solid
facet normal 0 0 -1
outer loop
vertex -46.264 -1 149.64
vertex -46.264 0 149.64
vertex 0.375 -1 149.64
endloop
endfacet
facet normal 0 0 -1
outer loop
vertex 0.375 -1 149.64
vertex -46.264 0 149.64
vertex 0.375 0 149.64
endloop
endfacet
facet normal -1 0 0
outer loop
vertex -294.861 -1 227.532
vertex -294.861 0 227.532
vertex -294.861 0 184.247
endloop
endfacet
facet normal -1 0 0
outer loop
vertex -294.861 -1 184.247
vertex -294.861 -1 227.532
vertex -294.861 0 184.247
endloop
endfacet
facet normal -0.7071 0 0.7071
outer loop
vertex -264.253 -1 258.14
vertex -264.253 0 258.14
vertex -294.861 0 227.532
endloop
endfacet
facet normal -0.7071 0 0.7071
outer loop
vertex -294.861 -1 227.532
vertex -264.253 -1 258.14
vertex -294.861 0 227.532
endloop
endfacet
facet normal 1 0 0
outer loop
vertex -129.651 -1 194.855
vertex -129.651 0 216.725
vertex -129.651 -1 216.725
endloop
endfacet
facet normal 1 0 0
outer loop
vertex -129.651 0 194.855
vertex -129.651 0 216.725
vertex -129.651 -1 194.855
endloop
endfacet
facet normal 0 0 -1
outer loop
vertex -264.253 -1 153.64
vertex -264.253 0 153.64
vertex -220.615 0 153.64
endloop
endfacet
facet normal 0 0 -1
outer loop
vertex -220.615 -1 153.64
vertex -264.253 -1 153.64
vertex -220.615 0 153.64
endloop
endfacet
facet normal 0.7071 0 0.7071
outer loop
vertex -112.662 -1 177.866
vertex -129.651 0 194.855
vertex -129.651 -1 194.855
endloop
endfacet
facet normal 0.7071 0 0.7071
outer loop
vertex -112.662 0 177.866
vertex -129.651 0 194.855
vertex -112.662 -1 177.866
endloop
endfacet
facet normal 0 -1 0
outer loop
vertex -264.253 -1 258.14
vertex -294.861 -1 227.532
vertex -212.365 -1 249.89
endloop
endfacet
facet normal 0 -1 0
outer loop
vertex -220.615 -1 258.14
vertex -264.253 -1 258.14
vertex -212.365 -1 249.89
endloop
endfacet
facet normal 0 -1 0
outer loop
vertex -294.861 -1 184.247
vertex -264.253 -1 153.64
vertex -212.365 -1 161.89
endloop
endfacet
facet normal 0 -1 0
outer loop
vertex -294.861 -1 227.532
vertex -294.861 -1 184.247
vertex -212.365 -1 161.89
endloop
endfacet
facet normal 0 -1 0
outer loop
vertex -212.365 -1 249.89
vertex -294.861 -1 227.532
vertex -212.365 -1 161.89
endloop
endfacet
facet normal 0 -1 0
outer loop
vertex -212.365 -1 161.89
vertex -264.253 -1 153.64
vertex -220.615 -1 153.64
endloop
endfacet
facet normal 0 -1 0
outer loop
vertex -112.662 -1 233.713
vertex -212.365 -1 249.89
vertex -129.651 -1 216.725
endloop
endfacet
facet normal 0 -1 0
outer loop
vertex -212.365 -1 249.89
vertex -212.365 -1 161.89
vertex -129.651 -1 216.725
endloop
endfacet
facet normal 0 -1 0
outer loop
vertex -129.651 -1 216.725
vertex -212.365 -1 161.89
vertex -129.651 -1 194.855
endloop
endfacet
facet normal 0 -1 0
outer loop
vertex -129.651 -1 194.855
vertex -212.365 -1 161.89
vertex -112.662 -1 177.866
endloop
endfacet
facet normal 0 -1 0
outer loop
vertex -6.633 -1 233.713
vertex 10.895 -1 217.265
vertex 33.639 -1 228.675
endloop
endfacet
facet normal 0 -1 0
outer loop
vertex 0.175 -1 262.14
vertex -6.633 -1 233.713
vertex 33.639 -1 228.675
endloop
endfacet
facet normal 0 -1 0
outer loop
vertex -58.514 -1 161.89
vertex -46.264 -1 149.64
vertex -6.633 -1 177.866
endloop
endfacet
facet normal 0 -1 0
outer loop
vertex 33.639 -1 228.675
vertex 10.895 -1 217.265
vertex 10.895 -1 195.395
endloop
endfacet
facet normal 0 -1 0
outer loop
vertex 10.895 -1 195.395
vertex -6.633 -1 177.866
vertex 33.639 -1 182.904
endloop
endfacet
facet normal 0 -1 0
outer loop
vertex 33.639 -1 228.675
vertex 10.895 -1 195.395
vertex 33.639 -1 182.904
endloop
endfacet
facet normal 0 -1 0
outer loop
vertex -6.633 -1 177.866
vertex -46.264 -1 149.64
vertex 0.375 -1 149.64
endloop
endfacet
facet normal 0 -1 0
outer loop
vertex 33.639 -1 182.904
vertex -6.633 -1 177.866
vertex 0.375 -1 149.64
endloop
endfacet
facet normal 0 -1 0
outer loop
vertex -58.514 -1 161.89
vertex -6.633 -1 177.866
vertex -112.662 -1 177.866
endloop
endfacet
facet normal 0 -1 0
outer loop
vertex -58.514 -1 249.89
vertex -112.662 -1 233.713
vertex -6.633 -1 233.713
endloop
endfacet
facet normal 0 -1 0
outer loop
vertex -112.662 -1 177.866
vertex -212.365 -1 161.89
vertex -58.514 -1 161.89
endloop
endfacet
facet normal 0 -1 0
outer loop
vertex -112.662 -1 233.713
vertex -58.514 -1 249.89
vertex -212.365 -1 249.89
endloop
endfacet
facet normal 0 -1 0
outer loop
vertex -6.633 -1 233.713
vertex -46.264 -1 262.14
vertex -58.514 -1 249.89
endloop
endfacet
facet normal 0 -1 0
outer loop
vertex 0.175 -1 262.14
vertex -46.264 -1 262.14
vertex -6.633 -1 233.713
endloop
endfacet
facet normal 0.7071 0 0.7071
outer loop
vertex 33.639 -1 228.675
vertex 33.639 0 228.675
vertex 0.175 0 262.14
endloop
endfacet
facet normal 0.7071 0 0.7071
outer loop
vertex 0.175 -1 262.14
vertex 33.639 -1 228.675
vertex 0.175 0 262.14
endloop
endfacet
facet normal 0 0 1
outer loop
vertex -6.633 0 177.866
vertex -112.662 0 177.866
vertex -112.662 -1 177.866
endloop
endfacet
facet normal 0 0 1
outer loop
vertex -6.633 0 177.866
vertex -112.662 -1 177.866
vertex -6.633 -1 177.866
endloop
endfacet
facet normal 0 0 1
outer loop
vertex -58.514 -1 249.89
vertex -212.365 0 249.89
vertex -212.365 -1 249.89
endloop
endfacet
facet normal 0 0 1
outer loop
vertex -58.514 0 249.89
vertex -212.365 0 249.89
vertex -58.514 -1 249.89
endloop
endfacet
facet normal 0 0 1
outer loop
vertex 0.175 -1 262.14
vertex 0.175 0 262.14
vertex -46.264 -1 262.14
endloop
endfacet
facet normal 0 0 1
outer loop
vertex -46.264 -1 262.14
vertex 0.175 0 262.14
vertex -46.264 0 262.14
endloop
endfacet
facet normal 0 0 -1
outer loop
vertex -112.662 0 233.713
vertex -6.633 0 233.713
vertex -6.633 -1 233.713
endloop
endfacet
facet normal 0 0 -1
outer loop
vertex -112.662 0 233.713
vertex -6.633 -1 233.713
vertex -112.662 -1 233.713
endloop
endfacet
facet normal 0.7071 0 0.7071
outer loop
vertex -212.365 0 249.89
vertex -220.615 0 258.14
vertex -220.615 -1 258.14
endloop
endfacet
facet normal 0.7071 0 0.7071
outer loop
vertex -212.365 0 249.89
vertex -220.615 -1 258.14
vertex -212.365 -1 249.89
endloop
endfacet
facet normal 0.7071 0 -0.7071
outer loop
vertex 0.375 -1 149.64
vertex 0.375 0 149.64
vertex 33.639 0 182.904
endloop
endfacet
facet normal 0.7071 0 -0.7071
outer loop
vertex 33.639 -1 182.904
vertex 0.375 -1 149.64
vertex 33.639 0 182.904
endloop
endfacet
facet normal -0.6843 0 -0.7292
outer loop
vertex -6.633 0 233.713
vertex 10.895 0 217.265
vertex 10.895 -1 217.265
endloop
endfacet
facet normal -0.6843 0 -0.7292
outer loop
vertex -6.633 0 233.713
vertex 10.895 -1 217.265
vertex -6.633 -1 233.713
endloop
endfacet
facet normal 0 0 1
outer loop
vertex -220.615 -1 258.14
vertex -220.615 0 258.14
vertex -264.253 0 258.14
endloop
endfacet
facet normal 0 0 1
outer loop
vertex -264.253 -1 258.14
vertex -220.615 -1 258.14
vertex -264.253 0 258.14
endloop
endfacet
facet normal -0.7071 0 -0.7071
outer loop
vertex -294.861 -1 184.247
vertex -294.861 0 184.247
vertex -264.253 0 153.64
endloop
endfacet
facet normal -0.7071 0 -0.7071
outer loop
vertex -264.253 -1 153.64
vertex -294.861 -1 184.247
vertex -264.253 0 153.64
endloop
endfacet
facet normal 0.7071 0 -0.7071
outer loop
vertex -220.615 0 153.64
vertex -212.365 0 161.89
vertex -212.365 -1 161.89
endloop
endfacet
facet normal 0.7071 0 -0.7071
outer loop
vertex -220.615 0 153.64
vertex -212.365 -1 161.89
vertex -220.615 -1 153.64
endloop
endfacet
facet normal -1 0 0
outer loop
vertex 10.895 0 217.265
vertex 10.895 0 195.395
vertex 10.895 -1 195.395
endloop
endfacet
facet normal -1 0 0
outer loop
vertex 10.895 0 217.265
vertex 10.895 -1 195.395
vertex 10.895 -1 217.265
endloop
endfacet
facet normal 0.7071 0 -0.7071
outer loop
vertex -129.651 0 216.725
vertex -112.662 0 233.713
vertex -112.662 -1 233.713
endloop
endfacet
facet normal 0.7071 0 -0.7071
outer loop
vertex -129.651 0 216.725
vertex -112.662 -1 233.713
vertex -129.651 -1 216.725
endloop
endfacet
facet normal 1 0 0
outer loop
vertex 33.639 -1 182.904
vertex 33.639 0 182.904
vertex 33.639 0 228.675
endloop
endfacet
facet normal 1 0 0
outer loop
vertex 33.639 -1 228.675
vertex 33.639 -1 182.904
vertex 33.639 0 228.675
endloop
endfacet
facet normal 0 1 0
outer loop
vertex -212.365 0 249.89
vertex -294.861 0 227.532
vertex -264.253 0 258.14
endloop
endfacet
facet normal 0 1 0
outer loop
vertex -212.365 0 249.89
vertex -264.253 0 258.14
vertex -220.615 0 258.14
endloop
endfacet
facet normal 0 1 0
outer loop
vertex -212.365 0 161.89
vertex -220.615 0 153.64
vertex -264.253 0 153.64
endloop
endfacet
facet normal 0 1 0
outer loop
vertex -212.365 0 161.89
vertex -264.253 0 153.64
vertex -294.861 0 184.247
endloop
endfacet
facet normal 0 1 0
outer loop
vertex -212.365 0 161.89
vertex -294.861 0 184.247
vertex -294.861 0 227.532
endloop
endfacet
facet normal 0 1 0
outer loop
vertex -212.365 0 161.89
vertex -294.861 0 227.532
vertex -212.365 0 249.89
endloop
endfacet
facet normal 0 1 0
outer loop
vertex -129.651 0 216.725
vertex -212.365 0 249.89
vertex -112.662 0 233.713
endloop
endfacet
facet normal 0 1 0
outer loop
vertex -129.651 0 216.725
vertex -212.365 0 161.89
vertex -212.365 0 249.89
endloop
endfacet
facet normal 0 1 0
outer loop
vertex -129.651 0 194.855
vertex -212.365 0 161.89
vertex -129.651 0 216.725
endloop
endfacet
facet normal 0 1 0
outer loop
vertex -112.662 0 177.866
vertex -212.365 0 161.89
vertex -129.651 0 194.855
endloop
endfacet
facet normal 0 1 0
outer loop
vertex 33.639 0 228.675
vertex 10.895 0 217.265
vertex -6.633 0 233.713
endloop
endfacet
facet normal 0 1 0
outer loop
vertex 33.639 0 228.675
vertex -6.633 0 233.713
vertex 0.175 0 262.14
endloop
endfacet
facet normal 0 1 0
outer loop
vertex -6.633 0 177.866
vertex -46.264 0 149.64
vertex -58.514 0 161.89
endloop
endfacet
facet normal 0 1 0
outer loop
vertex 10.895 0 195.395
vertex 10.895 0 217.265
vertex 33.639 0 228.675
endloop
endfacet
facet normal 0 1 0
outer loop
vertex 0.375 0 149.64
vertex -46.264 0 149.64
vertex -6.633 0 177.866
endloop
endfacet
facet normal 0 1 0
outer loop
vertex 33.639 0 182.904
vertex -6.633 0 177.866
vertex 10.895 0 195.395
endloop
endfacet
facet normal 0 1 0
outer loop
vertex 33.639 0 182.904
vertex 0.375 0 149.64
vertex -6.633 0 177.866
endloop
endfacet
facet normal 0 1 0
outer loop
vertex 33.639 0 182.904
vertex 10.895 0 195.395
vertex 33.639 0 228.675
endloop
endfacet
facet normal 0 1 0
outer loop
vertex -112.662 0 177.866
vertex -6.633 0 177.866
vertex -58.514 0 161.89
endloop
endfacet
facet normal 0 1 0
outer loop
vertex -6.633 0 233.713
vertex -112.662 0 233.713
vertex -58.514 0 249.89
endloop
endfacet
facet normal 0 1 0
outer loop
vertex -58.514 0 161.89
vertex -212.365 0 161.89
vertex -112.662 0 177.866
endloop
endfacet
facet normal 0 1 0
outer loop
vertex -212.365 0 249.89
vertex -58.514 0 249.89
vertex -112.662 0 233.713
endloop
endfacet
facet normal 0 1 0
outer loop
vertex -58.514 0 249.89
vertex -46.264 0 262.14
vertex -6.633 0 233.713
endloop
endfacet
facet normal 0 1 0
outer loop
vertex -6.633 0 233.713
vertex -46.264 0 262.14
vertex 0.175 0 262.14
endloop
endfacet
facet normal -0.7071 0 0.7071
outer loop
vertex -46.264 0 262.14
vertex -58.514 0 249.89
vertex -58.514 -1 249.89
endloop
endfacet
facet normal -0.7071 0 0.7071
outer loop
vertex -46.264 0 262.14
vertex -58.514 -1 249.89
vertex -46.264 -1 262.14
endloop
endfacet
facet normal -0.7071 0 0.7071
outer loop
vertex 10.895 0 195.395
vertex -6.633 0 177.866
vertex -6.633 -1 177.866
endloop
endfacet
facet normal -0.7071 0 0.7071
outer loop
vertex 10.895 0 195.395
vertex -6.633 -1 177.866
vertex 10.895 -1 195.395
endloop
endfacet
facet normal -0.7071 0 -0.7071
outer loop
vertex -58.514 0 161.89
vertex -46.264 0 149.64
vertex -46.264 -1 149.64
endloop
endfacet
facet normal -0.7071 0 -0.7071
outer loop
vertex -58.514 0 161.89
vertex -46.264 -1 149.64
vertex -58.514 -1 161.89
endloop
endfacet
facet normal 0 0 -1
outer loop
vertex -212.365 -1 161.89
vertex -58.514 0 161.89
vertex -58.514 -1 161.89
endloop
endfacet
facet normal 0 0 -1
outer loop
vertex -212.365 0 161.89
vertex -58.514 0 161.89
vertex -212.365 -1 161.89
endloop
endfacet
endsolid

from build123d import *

# Parameters (mm, degrees)
SM_BASE_FLANGE_1_DEPTH = 1
CUT_EXTRUDE_1_DEPTH    = 10
CUT_EXTRUDE_2_DEPTH    = 10


# Sheet-metal steps are written as plain solids
with BuildPart() as part:
    # Sketch 1 → Базовая кромка1 (new body)
    with BuildSketch(Plane(origin=(0, 0, 0), x_dir=(1, 0, 0), z_dir=(0, 1, 0))):
        Polygon((-58.513846144, -161.889640506), (-212.364567845, -161.889640506), (-220.864567845, -153.389640506), (-222.278781408, -153.389640506), (-264.356991895, -153.389640506), (-295.11077987, -184.143428482), (-295.11077987, -227.635852531), (-264.356991895, -258.389640506), (-222.278781408, -258.389640506), (-220.864567845, -258.389640506), (-212.364567845, -249.889640506), (-58.513846144, -249.889640506), (-46.013846144, -262.389640506), (-44.599632582, -262.389640506), (0.278072842, -262.389640506), (33.88922013, -228.778493218), (33.88922013, -182.800787794), (0.478072842, -149.389640506), (-44.599632582, -149.389640506), (-46.013846144, -149.389640506), align=None)
    extrude(amount=-SM_BASE_FLANGE_1_DEPTH)

    # Эскиз3 → Вырез-Вытянуть1 (cut)
    with BuildSketch(Plane(origin=(0, 0, 0), x_dir=(1, 0, 0), z_dir=(0, 1, 0))):
        Polygon((-129.650630124, -194.854768426), (-112.66234875, -177.866487052), (-6.632911498, -177.866487052), (10.895241956, -195.394640506), (10.895241956, -217.265248922), (-6.633389706, -233.712753004), (-112.662389706, -233.712753004), (-129.650630124, -216.724512586), align=None)
    extrude(amount=-CUT_EXTRUDE_1_DEPTH, mode=Mode.SUBTRACT)

    # Эскиз4 → Вырез-Вытянуть2 (cut)
    with BuildSketch(Plane(origin=(0, 0, 0), x_dir=(1, 0, 0), z_dir=(0, 1, 0))):
        Polygon((-264.253438504, -153.639640506), (-216.125737308, -153.639640506), (-216.125737308, -129.066031108), (-310.48708542, -129.066031108), (-310.48708542, -280.318410607), (-216.781479831, -280.318410607), (-216.781479831, -258.139640506), (-264.253438504, -258.139640506), (-294.86077987, -227.53229914), (-294.86077987, -184.246981872), align=None)
        Polygon((-47.513022755, -149.639640506), (0.374519451, -149.639640506), (33.63922013, -182.904341185), (33.63922013, -228.674939827), (0.174519451, -262.139640506), (-50.1499885, -262.139640506), (-50.1499885, -286.805350845), (64.547971273, -286.805350845), (64.547971273, -129.066031108), (-47.513022755, -129.066031108), align=None)
    extrude(amount=-CUT_EXTRUDE_2_DEPTH, mode=Mode.SUBTRACT)


solid = part.part
